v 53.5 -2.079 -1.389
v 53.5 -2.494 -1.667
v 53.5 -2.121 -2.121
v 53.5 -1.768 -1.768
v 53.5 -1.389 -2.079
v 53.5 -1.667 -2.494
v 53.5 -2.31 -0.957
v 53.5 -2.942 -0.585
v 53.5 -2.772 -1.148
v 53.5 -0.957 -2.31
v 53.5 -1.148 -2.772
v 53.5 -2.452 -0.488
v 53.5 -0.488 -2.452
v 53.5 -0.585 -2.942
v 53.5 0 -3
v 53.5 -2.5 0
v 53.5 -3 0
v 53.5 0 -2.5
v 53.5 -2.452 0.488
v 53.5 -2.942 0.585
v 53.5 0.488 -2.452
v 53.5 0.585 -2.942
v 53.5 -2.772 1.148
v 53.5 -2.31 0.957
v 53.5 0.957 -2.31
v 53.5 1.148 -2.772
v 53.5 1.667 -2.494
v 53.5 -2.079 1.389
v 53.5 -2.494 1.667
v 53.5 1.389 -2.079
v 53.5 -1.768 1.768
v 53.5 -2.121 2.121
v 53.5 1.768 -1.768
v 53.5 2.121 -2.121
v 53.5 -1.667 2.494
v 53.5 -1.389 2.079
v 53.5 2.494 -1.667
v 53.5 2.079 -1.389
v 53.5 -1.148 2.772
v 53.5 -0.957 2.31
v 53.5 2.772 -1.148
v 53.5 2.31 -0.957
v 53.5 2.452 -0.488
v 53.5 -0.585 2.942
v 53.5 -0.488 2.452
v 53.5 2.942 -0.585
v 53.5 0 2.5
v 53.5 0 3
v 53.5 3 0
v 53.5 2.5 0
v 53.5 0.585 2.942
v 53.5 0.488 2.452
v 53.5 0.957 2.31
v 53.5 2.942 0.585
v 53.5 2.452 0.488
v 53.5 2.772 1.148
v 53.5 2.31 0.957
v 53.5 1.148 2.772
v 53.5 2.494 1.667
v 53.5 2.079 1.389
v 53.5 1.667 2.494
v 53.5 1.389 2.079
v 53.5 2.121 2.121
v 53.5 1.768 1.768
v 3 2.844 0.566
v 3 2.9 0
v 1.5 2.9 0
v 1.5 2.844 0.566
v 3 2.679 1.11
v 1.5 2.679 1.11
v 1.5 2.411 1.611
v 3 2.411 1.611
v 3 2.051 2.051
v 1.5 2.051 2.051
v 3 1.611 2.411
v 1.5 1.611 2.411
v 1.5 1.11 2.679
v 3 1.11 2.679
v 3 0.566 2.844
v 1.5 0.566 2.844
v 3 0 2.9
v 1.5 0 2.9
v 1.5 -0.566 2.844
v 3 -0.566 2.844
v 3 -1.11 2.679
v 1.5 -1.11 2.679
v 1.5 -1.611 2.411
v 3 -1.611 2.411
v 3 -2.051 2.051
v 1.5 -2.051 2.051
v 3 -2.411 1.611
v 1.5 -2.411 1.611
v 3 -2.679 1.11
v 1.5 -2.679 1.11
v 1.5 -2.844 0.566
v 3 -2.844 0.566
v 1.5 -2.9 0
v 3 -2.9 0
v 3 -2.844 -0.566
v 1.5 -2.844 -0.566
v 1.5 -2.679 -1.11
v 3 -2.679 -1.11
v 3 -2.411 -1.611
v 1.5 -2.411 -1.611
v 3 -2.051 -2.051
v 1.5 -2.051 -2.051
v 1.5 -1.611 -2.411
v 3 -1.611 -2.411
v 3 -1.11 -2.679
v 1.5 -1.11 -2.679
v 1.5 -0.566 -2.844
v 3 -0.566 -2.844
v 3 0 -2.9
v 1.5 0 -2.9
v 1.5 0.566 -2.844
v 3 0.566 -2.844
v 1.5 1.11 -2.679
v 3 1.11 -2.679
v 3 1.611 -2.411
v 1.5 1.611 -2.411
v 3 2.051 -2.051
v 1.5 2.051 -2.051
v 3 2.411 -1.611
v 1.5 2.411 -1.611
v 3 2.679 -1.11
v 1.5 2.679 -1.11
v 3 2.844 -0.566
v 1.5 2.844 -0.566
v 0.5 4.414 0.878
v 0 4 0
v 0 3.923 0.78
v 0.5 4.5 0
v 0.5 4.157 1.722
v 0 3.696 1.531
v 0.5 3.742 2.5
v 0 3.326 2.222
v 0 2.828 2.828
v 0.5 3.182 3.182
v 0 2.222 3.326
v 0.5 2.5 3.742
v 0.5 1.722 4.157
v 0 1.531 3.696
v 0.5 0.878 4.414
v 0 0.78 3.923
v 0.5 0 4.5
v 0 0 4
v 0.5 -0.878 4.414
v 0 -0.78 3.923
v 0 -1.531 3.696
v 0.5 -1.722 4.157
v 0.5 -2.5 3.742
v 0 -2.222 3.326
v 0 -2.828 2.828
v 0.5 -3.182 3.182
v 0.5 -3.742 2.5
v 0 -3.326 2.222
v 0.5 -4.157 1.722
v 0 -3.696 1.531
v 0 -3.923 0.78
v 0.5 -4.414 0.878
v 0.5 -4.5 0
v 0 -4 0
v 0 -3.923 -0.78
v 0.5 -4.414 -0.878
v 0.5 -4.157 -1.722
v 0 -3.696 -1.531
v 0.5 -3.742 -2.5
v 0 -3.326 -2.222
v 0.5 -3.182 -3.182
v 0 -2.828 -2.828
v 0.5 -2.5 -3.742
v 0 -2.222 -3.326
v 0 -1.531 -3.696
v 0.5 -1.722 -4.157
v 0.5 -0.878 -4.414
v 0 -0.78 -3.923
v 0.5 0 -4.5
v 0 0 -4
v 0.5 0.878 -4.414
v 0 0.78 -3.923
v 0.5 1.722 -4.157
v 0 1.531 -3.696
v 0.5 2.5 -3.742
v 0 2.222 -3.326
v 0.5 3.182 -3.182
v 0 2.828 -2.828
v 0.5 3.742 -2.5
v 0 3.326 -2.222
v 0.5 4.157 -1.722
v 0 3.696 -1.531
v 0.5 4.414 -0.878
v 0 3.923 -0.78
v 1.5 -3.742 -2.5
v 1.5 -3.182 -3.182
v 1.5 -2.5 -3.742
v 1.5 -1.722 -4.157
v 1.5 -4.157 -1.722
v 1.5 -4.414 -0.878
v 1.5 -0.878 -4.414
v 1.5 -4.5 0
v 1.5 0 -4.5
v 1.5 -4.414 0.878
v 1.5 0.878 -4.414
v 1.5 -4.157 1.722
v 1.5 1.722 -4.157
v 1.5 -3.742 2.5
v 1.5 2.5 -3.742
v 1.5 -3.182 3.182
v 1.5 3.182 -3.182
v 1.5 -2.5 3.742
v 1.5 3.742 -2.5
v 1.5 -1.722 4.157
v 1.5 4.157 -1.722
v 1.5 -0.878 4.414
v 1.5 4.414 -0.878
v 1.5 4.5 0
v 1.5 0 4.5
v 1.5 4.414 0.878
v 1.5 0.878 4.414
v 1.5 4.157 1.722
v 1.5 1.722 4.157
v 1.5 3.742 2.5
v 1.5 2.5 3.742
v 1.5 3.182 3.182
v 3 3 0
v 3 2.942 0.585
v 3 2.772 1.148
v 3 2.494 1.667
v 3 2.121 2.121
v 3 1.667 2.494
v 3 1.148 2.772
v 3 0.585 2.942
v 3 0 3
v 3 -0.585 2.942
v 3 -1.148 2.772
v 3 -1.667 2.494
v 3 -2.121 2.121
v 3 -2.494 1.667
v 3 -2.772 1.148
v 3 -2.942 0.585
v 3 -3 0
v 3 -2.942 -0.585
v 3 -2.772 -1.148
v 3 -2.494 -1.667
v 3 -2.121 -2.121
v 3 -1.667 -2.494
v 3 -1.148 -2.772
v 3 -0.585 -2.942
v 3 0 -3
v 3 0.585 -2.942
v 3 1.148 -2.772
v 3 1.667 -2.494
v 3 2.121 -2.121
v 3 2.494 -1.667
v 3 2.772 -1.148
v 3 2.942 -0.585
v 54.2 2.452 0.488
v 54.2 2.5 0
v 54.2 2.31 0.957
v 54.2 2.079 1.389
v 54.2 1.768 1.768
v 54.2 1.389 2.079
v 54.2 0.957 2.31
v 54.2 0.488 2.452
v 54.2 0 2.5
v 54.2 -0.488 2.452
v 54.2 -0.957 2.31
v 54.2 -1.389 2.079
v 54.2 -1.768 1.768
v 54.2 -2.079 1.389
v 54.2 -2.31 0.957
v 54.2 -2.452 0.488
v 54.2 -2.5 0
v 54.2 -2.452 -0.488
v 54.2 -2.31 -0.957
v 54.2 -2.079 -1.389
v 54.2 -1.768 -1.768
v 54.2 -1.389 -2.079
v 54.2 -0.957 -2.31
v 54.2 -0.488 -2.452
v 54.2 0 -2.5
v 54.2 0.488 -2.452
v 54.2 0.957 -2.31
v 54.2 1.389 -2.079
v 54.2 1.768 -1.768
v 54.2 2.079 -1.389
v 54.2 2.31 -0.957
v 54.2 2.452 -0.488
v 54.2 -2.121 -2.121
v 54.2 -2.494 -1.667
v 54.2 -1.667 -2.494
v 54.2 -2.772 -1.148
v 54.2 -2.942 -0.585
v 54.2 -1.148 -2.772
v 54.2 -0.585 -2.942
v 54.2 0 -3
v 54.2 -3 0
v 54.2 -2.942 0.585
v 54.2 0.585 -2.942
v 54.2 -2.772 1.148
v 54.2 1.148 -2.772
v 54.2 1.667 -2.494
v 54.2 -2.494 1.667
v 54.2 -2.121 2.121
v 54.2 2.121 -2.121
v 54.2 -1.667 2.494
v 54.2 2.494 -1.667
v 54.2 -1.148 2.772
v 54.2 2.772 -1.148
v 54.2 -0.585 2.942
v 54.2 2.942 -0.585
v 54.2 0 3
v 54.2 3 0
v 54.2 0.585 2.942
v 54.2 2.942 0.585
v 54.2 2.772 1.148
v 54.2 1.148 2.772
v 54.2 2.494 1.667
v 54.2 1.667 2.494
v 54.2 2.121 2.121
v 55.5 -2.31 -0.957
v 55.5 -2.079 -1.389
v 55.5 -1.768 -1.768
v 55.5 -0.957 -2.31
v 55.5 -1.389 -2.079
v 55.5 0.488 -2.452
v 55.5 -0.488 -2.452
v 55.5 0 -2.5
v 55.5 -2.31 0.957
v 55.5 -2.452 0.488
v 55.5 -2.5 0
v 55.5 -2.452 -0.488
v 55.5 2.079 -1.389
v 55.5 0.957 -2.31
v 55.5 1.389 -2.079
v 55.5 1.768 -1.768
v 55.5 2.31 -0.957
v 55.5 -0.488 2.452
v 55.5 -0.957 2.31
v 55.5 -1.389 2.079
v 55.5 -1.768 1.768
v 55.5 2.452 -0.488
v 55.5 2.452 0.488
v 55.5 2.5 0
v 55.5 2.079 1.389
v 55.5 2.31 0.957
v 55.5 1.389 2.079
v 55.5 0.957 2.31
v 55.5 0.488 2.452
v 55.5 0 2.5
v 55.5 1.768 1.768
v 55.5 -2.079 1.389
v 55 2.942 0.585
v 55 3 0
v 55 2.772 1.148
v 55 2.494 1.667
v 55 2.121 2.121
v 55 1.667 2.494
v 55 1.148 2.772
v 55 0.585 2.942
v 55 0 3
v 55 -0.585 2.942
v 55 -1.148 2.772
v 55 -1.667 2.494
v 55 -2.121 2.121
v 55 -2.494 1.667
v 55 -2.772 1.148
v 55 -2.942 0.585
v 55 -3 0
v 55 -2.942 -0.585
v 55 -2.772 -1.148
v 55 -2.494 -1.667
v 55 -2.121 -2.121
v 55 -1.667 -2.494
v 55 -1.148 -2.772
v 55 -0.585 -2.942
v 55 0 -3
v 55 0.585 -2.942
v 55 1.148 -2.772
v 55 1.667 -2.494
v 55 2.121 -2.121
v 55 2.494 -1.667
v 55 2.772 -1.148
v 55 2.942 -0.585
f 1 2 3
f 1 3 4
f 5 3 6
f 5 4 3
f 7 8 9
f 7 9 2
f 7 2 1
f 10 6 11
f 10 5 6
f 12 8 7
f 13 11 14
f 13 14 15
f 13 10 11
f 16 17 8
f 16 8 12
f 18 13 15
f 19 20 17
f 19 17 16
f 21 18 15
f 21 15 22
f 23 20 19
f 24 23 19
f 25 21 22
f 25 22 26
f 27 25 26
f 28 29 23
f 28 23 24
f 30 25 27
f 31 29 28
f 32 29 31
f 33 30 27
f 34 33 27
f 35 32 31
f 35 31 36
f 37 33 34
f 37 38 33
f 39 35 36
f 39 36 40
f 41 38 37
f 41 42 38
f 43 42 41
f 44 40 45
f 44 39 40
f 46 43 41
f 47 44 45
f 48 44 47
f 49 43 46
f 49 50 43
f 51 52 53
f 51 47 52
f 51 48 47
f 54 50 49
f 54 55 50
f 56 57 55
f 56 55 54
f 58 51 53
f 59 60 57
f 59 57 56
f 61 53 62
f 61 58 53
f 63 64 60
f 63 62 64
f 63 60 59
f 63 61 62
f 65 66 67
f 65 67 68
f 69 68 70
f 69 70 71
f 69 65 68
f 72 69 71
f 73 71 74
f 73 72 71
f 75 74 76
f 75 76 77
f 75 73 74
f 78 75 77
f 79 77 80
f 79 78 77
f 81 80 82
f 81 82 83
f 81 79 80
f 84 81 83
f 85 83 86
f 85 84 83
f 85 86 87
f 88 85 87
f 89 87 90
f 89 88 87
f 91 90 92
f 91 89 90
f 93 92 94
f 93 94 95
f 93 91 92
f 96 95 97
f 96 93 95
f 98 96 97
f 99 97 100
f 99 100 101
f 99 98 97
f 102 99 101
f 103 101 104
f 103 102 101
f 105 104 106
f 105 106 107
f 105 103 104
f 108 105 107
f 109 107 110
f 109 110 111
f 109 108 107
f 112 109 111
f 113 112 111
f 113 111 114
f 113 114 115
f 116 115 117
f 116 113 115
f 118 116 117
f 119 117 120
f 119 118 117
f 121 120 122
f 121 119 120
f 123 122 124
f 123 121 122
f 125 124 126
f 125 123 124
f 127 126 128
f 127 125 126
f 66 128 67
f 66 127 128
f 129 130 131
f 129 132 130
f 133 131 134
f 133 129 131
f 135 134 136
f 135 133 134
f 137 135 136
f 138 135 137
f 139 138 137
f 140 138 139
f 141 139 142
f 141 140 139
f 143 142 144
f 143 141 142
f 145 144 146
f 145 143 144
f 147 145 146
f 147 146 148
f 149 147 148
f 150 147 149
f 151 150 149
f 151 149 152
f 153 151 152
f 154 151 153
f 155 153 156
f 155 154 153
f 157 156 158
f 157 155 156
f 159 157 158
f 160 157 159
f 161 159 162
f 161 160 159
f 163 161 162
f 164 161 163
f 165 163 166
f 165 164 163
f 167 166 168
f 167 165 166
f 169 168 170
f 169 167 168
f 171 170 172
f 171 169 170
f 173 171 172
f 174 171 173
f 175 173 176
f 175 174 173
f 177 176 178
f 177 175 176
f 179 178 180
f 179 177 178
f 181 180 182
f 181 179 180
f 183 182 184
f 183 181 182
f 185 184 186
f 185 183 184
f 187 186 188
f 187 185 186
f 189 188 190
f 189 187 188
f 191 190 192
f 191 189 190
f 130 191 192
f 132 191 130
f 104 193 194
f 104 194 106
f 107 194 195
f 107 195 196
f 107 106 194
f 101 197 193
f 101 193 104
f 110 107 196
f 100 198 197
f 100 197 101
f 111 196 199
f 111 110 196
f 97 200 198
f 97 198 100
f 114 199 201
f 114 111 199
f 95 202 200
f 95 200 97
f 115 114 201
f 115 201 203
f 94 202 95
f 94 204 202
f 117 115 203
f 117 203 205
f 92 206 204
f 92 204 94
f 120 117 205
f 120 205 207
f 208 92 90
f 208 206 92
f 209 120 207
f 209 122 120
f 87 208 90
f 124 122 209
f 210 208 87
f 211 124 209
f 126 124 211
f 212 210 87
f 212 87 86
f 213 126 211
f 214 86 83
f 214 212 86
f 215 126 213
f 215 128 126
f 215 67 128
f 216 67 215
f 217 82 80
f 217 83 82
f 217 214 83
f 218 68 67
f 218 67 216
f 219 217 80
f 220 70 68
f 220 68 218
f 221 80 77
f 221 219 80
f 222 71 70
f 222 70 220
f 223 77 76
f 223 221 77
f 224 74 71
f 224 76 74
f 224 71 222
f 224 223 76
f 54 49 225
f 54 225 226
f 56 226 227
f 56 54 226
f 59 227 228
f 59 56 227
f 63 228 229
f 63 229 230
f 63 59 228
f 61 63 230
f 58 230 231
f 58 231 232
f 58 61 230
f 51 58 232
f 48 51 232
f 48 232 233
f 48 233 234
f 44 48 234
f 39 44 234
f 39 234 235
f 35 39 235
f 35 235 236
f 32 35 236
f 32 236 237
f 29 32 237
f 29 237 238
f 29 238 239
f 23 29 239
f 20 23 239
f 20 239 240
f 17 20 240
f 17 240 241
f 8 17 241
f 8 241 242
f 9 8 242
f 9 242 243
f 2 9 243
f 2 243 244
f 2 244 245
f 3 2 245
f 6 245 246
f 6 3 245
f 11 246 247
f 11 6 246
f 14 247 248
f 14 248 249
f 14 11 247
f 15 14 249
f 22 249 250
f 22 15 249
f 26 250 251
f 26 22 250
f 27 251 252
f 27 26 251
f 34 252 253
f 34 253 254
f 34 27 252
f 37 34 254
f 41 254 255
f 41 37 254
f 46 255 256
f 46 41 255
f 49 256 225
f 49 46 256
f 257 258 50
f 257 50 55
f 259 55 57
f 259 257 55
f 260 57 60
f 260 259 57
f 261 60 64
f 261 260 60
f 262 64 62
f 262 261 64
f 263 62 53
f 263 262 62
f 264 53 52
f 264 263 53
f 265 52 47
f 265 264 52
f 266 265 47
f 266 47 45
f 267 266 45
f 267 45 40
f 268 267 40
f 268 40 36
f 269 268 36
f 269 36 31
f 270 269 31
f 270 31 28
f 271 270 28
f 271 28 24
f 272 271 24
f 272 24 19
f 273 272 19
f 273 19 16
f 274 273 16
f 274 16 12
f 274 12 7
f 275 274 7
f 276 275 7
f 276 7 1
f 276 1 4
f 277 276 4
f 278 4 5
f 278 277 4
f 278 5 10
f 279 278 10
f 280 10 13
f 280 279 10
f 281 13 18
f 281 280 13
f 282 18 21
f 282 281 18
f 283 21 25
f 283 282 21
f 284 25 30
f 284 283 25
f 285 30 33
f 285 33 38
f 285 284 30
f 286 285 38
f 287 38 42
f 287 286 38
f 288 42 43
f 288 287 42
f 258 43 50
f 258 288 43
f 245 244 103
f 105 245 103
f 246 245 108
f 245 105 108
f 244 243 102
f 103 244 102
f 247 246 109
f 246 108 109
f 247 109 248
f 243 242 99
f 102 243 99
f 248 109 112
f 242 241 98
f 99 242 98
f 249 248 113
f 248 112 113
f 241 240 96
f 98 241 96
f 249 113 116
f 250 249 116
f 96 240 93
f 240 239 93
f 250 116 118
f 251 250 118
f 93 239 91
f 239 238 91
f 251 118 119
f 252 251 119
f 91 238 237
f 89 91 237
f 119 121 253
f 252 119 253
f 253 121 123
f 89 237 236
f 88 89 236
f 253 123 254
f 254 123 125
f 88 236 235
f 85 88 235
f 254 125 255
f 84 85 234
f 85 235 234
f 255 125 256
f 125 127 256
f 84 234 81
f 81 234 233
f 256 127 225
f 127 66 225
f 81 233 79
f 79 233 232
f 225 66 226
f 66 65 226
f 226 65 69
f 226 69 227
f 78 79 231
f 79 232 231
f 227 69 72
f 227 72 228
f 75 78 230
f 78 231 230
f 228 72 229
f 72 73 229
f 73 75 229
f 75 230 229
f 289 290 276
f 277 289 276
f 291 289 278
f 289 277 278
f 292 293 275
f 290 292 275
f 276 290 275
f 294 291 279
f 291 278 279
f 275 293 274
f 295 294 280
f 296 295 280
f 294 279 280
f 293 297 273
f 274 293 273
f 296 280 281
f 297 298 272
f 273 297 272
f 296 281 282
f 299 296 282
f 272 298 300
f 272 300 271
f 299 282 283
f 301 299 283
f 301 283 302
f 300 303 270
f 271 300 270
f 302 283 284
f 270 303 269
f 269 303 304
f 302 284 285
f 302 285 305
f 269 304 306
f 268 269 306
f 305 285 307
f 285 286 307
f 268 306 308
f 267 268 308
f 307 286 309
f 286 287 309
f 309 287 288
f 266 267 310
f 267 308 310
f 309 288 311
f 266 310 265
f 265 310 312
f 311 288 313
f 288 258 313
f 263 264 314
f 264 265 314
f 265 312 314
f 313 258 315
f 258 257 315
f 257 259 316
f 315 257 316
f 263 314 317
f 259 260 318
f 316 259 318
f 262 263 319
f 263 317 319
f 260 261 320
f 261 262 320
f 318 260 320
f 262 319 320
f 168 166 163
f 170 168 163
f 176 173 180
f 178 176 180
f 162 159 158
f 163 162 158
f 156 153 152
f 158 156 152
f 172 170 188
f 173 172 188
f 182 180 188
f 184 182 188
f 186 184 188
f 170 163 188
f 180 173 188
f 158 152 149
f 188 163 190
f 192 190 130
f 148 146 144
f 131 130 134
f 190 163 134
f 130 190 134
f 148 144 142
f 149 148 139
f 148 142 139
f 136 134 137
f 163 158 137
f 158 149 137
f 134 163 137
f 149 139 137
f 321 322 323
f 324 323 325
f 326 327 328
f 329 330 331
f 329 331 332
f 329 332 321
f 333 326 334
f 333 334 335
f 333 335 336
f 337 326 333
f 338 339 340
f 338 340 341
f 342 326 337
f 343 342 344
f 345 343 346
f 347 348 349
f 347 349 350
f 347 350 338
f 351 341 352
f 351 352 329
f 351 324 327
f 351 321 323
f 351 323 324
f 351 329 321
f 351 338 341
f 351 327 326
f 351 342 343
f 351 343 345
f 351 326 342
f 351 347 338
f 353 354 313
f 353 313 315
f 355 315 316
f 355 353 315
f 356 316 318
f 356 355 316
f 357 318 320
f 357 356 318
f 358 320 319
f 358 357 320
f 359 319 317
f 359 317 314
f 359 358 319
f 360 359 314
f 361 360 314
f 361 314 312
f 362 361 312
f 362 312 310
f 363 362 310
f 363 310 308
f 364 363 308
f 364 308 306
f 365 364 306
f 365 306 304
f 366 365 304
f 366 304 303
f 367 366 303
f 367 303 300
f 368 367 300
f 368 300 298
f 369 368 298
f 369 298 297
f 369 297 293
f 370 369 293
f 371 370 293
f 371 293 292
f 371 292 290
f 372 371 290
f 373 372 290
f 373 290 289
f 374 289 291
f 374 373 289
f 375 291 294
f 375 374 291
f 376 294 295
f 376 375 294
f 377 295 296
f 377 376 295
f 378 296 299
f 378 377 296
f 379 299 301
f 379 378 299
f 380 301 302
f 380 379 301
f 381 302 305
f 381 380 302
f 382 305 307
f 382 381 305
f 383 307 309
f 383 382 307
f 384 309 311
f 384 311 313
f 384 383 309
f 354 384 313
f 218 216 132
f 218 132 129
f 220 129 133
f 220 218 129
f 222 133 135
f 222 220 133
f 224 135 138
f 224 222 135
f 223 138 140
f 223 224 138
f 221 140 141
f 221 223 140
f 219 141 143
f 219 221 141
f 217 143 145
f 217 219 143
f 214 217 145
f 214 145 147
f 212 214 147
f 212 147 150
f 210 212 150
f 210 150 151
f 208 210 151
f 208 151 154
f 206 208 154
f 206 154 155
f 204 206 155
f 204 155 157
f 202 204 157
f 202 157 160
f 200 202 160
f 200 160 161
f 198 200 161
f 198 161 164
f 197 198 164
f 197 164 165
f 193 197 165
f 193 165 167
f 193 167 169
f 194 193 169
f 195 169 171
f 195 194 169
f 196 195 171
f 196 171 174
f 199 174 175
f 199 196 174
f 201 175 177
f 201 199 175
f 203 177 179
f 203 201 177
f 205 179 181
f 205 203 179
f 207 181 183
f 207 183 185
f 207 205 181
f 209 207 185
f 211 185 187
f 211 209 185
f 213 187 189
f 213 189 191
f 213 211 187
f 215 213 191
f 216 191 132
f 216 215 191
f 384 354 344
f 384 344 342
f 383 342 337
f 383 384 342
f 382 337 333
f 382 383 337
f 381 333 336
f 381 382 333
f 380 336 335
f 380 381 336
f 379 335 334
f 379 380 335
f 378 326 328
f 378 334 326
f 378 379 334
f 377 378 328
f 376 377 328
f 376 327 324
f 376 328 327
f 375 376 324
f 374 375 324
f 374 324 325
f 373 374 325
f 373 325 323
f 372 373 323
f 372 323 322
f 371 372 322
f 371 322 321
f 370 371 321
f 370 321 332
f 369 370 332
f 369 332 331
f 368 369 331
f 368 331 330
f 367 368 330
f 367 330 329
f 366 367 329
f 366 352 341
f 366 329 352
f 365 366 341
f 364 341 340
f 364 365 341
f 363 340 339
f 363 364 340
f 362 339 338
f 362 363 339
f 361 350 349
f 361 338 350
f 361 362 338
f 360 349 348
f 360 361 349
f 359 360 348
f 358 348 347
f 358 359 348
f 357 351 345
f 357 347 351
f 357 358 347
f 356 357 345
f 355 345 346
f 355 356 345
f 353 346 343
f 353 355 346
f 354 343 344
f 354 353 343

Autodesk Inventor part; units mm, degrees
sketch "Sketch_1" plane through (0, 0, 0) normal (0, 0, 1) x (1, 0, 0)
  line L0 (55.5, 0) -> (0, 0)
  line L1 (0, 0) -> (0, 4)
  line L2 (0, 4) -> (0.5, 4.5)
  line L3 (0.5, 4.5) -> (1.5, 4.5)
  line L4 (1.5, 4.5) -> (1.5, 2.9)
  line L5 (1.5, 2.9) -> (3, 2.9)
  line L6 (3, 2.9) -> (3, 3)
  line L7 (3, 3) -> (53.5, 3)
  line L8 (53.5, 3) -> (53.5, 2.5)
  line L9 (53.5, 2.5) -> (54.2, 2.5)
  line L10 (54.2, 2.5) -> (54.2, 3)
  line L11 (54.2, 3) -> (55, 3)
  line L12 (55, 3) -> (55.5, 2.5)
  line L13 (55.5, 2.5) -> (55.5, 0)
  line L14 (55.5, 0) -> (0, 0)
revolve "Revolution1" add sketch "Sketch_1" angle 360 about axis through (55.5, 0, 0) along (1, 0, 0)
ref_plane "pin_to_body_XY" through (1.5, 0, 0) normal (1, 0, 0) x (0, 0, -1)
ref_plane "pin_to_body_YZ" through (1.5, 0, 0) normal (0, 0, -1) x (0, 1, 0)
ref_plane "pin_to_body_ZX" through (1.5, 0, 0) normal (0, 1, 0) x (1, 0, 0)
ref_plane "pin_to_knuckle_XY" through (27.5, 0, 0) normal (-1, 0, 0) x (0, 0, -1)
ref_plane "pin_to_knuckle_YZ" through (27.5, 0, 0) normal (0, 0, -1) x (0, -1, 0)
ref_plane "pin_to_knuckle_ZX" through (27.5, 0, 0) normal (0, -1, 0) x (-1, 0, 0)
ref_plane "pin_to_rring_XY" through (53.85, 0, 0) normal (-1, 0, 0) x (0, 0, -1)
ref_plane "pin_to_rring_YZ" through (53.85, 0, 0) normal (0, 0, -1) x (0, -1, 0)
ref_plane "pin_to_rring_ZX" through (53.85, 0, 0) normal (0, -1, 0) x (-1, 0, 0)
properties part number "GSHCCGH6-52.0_D" material "ステンレス鋼"
